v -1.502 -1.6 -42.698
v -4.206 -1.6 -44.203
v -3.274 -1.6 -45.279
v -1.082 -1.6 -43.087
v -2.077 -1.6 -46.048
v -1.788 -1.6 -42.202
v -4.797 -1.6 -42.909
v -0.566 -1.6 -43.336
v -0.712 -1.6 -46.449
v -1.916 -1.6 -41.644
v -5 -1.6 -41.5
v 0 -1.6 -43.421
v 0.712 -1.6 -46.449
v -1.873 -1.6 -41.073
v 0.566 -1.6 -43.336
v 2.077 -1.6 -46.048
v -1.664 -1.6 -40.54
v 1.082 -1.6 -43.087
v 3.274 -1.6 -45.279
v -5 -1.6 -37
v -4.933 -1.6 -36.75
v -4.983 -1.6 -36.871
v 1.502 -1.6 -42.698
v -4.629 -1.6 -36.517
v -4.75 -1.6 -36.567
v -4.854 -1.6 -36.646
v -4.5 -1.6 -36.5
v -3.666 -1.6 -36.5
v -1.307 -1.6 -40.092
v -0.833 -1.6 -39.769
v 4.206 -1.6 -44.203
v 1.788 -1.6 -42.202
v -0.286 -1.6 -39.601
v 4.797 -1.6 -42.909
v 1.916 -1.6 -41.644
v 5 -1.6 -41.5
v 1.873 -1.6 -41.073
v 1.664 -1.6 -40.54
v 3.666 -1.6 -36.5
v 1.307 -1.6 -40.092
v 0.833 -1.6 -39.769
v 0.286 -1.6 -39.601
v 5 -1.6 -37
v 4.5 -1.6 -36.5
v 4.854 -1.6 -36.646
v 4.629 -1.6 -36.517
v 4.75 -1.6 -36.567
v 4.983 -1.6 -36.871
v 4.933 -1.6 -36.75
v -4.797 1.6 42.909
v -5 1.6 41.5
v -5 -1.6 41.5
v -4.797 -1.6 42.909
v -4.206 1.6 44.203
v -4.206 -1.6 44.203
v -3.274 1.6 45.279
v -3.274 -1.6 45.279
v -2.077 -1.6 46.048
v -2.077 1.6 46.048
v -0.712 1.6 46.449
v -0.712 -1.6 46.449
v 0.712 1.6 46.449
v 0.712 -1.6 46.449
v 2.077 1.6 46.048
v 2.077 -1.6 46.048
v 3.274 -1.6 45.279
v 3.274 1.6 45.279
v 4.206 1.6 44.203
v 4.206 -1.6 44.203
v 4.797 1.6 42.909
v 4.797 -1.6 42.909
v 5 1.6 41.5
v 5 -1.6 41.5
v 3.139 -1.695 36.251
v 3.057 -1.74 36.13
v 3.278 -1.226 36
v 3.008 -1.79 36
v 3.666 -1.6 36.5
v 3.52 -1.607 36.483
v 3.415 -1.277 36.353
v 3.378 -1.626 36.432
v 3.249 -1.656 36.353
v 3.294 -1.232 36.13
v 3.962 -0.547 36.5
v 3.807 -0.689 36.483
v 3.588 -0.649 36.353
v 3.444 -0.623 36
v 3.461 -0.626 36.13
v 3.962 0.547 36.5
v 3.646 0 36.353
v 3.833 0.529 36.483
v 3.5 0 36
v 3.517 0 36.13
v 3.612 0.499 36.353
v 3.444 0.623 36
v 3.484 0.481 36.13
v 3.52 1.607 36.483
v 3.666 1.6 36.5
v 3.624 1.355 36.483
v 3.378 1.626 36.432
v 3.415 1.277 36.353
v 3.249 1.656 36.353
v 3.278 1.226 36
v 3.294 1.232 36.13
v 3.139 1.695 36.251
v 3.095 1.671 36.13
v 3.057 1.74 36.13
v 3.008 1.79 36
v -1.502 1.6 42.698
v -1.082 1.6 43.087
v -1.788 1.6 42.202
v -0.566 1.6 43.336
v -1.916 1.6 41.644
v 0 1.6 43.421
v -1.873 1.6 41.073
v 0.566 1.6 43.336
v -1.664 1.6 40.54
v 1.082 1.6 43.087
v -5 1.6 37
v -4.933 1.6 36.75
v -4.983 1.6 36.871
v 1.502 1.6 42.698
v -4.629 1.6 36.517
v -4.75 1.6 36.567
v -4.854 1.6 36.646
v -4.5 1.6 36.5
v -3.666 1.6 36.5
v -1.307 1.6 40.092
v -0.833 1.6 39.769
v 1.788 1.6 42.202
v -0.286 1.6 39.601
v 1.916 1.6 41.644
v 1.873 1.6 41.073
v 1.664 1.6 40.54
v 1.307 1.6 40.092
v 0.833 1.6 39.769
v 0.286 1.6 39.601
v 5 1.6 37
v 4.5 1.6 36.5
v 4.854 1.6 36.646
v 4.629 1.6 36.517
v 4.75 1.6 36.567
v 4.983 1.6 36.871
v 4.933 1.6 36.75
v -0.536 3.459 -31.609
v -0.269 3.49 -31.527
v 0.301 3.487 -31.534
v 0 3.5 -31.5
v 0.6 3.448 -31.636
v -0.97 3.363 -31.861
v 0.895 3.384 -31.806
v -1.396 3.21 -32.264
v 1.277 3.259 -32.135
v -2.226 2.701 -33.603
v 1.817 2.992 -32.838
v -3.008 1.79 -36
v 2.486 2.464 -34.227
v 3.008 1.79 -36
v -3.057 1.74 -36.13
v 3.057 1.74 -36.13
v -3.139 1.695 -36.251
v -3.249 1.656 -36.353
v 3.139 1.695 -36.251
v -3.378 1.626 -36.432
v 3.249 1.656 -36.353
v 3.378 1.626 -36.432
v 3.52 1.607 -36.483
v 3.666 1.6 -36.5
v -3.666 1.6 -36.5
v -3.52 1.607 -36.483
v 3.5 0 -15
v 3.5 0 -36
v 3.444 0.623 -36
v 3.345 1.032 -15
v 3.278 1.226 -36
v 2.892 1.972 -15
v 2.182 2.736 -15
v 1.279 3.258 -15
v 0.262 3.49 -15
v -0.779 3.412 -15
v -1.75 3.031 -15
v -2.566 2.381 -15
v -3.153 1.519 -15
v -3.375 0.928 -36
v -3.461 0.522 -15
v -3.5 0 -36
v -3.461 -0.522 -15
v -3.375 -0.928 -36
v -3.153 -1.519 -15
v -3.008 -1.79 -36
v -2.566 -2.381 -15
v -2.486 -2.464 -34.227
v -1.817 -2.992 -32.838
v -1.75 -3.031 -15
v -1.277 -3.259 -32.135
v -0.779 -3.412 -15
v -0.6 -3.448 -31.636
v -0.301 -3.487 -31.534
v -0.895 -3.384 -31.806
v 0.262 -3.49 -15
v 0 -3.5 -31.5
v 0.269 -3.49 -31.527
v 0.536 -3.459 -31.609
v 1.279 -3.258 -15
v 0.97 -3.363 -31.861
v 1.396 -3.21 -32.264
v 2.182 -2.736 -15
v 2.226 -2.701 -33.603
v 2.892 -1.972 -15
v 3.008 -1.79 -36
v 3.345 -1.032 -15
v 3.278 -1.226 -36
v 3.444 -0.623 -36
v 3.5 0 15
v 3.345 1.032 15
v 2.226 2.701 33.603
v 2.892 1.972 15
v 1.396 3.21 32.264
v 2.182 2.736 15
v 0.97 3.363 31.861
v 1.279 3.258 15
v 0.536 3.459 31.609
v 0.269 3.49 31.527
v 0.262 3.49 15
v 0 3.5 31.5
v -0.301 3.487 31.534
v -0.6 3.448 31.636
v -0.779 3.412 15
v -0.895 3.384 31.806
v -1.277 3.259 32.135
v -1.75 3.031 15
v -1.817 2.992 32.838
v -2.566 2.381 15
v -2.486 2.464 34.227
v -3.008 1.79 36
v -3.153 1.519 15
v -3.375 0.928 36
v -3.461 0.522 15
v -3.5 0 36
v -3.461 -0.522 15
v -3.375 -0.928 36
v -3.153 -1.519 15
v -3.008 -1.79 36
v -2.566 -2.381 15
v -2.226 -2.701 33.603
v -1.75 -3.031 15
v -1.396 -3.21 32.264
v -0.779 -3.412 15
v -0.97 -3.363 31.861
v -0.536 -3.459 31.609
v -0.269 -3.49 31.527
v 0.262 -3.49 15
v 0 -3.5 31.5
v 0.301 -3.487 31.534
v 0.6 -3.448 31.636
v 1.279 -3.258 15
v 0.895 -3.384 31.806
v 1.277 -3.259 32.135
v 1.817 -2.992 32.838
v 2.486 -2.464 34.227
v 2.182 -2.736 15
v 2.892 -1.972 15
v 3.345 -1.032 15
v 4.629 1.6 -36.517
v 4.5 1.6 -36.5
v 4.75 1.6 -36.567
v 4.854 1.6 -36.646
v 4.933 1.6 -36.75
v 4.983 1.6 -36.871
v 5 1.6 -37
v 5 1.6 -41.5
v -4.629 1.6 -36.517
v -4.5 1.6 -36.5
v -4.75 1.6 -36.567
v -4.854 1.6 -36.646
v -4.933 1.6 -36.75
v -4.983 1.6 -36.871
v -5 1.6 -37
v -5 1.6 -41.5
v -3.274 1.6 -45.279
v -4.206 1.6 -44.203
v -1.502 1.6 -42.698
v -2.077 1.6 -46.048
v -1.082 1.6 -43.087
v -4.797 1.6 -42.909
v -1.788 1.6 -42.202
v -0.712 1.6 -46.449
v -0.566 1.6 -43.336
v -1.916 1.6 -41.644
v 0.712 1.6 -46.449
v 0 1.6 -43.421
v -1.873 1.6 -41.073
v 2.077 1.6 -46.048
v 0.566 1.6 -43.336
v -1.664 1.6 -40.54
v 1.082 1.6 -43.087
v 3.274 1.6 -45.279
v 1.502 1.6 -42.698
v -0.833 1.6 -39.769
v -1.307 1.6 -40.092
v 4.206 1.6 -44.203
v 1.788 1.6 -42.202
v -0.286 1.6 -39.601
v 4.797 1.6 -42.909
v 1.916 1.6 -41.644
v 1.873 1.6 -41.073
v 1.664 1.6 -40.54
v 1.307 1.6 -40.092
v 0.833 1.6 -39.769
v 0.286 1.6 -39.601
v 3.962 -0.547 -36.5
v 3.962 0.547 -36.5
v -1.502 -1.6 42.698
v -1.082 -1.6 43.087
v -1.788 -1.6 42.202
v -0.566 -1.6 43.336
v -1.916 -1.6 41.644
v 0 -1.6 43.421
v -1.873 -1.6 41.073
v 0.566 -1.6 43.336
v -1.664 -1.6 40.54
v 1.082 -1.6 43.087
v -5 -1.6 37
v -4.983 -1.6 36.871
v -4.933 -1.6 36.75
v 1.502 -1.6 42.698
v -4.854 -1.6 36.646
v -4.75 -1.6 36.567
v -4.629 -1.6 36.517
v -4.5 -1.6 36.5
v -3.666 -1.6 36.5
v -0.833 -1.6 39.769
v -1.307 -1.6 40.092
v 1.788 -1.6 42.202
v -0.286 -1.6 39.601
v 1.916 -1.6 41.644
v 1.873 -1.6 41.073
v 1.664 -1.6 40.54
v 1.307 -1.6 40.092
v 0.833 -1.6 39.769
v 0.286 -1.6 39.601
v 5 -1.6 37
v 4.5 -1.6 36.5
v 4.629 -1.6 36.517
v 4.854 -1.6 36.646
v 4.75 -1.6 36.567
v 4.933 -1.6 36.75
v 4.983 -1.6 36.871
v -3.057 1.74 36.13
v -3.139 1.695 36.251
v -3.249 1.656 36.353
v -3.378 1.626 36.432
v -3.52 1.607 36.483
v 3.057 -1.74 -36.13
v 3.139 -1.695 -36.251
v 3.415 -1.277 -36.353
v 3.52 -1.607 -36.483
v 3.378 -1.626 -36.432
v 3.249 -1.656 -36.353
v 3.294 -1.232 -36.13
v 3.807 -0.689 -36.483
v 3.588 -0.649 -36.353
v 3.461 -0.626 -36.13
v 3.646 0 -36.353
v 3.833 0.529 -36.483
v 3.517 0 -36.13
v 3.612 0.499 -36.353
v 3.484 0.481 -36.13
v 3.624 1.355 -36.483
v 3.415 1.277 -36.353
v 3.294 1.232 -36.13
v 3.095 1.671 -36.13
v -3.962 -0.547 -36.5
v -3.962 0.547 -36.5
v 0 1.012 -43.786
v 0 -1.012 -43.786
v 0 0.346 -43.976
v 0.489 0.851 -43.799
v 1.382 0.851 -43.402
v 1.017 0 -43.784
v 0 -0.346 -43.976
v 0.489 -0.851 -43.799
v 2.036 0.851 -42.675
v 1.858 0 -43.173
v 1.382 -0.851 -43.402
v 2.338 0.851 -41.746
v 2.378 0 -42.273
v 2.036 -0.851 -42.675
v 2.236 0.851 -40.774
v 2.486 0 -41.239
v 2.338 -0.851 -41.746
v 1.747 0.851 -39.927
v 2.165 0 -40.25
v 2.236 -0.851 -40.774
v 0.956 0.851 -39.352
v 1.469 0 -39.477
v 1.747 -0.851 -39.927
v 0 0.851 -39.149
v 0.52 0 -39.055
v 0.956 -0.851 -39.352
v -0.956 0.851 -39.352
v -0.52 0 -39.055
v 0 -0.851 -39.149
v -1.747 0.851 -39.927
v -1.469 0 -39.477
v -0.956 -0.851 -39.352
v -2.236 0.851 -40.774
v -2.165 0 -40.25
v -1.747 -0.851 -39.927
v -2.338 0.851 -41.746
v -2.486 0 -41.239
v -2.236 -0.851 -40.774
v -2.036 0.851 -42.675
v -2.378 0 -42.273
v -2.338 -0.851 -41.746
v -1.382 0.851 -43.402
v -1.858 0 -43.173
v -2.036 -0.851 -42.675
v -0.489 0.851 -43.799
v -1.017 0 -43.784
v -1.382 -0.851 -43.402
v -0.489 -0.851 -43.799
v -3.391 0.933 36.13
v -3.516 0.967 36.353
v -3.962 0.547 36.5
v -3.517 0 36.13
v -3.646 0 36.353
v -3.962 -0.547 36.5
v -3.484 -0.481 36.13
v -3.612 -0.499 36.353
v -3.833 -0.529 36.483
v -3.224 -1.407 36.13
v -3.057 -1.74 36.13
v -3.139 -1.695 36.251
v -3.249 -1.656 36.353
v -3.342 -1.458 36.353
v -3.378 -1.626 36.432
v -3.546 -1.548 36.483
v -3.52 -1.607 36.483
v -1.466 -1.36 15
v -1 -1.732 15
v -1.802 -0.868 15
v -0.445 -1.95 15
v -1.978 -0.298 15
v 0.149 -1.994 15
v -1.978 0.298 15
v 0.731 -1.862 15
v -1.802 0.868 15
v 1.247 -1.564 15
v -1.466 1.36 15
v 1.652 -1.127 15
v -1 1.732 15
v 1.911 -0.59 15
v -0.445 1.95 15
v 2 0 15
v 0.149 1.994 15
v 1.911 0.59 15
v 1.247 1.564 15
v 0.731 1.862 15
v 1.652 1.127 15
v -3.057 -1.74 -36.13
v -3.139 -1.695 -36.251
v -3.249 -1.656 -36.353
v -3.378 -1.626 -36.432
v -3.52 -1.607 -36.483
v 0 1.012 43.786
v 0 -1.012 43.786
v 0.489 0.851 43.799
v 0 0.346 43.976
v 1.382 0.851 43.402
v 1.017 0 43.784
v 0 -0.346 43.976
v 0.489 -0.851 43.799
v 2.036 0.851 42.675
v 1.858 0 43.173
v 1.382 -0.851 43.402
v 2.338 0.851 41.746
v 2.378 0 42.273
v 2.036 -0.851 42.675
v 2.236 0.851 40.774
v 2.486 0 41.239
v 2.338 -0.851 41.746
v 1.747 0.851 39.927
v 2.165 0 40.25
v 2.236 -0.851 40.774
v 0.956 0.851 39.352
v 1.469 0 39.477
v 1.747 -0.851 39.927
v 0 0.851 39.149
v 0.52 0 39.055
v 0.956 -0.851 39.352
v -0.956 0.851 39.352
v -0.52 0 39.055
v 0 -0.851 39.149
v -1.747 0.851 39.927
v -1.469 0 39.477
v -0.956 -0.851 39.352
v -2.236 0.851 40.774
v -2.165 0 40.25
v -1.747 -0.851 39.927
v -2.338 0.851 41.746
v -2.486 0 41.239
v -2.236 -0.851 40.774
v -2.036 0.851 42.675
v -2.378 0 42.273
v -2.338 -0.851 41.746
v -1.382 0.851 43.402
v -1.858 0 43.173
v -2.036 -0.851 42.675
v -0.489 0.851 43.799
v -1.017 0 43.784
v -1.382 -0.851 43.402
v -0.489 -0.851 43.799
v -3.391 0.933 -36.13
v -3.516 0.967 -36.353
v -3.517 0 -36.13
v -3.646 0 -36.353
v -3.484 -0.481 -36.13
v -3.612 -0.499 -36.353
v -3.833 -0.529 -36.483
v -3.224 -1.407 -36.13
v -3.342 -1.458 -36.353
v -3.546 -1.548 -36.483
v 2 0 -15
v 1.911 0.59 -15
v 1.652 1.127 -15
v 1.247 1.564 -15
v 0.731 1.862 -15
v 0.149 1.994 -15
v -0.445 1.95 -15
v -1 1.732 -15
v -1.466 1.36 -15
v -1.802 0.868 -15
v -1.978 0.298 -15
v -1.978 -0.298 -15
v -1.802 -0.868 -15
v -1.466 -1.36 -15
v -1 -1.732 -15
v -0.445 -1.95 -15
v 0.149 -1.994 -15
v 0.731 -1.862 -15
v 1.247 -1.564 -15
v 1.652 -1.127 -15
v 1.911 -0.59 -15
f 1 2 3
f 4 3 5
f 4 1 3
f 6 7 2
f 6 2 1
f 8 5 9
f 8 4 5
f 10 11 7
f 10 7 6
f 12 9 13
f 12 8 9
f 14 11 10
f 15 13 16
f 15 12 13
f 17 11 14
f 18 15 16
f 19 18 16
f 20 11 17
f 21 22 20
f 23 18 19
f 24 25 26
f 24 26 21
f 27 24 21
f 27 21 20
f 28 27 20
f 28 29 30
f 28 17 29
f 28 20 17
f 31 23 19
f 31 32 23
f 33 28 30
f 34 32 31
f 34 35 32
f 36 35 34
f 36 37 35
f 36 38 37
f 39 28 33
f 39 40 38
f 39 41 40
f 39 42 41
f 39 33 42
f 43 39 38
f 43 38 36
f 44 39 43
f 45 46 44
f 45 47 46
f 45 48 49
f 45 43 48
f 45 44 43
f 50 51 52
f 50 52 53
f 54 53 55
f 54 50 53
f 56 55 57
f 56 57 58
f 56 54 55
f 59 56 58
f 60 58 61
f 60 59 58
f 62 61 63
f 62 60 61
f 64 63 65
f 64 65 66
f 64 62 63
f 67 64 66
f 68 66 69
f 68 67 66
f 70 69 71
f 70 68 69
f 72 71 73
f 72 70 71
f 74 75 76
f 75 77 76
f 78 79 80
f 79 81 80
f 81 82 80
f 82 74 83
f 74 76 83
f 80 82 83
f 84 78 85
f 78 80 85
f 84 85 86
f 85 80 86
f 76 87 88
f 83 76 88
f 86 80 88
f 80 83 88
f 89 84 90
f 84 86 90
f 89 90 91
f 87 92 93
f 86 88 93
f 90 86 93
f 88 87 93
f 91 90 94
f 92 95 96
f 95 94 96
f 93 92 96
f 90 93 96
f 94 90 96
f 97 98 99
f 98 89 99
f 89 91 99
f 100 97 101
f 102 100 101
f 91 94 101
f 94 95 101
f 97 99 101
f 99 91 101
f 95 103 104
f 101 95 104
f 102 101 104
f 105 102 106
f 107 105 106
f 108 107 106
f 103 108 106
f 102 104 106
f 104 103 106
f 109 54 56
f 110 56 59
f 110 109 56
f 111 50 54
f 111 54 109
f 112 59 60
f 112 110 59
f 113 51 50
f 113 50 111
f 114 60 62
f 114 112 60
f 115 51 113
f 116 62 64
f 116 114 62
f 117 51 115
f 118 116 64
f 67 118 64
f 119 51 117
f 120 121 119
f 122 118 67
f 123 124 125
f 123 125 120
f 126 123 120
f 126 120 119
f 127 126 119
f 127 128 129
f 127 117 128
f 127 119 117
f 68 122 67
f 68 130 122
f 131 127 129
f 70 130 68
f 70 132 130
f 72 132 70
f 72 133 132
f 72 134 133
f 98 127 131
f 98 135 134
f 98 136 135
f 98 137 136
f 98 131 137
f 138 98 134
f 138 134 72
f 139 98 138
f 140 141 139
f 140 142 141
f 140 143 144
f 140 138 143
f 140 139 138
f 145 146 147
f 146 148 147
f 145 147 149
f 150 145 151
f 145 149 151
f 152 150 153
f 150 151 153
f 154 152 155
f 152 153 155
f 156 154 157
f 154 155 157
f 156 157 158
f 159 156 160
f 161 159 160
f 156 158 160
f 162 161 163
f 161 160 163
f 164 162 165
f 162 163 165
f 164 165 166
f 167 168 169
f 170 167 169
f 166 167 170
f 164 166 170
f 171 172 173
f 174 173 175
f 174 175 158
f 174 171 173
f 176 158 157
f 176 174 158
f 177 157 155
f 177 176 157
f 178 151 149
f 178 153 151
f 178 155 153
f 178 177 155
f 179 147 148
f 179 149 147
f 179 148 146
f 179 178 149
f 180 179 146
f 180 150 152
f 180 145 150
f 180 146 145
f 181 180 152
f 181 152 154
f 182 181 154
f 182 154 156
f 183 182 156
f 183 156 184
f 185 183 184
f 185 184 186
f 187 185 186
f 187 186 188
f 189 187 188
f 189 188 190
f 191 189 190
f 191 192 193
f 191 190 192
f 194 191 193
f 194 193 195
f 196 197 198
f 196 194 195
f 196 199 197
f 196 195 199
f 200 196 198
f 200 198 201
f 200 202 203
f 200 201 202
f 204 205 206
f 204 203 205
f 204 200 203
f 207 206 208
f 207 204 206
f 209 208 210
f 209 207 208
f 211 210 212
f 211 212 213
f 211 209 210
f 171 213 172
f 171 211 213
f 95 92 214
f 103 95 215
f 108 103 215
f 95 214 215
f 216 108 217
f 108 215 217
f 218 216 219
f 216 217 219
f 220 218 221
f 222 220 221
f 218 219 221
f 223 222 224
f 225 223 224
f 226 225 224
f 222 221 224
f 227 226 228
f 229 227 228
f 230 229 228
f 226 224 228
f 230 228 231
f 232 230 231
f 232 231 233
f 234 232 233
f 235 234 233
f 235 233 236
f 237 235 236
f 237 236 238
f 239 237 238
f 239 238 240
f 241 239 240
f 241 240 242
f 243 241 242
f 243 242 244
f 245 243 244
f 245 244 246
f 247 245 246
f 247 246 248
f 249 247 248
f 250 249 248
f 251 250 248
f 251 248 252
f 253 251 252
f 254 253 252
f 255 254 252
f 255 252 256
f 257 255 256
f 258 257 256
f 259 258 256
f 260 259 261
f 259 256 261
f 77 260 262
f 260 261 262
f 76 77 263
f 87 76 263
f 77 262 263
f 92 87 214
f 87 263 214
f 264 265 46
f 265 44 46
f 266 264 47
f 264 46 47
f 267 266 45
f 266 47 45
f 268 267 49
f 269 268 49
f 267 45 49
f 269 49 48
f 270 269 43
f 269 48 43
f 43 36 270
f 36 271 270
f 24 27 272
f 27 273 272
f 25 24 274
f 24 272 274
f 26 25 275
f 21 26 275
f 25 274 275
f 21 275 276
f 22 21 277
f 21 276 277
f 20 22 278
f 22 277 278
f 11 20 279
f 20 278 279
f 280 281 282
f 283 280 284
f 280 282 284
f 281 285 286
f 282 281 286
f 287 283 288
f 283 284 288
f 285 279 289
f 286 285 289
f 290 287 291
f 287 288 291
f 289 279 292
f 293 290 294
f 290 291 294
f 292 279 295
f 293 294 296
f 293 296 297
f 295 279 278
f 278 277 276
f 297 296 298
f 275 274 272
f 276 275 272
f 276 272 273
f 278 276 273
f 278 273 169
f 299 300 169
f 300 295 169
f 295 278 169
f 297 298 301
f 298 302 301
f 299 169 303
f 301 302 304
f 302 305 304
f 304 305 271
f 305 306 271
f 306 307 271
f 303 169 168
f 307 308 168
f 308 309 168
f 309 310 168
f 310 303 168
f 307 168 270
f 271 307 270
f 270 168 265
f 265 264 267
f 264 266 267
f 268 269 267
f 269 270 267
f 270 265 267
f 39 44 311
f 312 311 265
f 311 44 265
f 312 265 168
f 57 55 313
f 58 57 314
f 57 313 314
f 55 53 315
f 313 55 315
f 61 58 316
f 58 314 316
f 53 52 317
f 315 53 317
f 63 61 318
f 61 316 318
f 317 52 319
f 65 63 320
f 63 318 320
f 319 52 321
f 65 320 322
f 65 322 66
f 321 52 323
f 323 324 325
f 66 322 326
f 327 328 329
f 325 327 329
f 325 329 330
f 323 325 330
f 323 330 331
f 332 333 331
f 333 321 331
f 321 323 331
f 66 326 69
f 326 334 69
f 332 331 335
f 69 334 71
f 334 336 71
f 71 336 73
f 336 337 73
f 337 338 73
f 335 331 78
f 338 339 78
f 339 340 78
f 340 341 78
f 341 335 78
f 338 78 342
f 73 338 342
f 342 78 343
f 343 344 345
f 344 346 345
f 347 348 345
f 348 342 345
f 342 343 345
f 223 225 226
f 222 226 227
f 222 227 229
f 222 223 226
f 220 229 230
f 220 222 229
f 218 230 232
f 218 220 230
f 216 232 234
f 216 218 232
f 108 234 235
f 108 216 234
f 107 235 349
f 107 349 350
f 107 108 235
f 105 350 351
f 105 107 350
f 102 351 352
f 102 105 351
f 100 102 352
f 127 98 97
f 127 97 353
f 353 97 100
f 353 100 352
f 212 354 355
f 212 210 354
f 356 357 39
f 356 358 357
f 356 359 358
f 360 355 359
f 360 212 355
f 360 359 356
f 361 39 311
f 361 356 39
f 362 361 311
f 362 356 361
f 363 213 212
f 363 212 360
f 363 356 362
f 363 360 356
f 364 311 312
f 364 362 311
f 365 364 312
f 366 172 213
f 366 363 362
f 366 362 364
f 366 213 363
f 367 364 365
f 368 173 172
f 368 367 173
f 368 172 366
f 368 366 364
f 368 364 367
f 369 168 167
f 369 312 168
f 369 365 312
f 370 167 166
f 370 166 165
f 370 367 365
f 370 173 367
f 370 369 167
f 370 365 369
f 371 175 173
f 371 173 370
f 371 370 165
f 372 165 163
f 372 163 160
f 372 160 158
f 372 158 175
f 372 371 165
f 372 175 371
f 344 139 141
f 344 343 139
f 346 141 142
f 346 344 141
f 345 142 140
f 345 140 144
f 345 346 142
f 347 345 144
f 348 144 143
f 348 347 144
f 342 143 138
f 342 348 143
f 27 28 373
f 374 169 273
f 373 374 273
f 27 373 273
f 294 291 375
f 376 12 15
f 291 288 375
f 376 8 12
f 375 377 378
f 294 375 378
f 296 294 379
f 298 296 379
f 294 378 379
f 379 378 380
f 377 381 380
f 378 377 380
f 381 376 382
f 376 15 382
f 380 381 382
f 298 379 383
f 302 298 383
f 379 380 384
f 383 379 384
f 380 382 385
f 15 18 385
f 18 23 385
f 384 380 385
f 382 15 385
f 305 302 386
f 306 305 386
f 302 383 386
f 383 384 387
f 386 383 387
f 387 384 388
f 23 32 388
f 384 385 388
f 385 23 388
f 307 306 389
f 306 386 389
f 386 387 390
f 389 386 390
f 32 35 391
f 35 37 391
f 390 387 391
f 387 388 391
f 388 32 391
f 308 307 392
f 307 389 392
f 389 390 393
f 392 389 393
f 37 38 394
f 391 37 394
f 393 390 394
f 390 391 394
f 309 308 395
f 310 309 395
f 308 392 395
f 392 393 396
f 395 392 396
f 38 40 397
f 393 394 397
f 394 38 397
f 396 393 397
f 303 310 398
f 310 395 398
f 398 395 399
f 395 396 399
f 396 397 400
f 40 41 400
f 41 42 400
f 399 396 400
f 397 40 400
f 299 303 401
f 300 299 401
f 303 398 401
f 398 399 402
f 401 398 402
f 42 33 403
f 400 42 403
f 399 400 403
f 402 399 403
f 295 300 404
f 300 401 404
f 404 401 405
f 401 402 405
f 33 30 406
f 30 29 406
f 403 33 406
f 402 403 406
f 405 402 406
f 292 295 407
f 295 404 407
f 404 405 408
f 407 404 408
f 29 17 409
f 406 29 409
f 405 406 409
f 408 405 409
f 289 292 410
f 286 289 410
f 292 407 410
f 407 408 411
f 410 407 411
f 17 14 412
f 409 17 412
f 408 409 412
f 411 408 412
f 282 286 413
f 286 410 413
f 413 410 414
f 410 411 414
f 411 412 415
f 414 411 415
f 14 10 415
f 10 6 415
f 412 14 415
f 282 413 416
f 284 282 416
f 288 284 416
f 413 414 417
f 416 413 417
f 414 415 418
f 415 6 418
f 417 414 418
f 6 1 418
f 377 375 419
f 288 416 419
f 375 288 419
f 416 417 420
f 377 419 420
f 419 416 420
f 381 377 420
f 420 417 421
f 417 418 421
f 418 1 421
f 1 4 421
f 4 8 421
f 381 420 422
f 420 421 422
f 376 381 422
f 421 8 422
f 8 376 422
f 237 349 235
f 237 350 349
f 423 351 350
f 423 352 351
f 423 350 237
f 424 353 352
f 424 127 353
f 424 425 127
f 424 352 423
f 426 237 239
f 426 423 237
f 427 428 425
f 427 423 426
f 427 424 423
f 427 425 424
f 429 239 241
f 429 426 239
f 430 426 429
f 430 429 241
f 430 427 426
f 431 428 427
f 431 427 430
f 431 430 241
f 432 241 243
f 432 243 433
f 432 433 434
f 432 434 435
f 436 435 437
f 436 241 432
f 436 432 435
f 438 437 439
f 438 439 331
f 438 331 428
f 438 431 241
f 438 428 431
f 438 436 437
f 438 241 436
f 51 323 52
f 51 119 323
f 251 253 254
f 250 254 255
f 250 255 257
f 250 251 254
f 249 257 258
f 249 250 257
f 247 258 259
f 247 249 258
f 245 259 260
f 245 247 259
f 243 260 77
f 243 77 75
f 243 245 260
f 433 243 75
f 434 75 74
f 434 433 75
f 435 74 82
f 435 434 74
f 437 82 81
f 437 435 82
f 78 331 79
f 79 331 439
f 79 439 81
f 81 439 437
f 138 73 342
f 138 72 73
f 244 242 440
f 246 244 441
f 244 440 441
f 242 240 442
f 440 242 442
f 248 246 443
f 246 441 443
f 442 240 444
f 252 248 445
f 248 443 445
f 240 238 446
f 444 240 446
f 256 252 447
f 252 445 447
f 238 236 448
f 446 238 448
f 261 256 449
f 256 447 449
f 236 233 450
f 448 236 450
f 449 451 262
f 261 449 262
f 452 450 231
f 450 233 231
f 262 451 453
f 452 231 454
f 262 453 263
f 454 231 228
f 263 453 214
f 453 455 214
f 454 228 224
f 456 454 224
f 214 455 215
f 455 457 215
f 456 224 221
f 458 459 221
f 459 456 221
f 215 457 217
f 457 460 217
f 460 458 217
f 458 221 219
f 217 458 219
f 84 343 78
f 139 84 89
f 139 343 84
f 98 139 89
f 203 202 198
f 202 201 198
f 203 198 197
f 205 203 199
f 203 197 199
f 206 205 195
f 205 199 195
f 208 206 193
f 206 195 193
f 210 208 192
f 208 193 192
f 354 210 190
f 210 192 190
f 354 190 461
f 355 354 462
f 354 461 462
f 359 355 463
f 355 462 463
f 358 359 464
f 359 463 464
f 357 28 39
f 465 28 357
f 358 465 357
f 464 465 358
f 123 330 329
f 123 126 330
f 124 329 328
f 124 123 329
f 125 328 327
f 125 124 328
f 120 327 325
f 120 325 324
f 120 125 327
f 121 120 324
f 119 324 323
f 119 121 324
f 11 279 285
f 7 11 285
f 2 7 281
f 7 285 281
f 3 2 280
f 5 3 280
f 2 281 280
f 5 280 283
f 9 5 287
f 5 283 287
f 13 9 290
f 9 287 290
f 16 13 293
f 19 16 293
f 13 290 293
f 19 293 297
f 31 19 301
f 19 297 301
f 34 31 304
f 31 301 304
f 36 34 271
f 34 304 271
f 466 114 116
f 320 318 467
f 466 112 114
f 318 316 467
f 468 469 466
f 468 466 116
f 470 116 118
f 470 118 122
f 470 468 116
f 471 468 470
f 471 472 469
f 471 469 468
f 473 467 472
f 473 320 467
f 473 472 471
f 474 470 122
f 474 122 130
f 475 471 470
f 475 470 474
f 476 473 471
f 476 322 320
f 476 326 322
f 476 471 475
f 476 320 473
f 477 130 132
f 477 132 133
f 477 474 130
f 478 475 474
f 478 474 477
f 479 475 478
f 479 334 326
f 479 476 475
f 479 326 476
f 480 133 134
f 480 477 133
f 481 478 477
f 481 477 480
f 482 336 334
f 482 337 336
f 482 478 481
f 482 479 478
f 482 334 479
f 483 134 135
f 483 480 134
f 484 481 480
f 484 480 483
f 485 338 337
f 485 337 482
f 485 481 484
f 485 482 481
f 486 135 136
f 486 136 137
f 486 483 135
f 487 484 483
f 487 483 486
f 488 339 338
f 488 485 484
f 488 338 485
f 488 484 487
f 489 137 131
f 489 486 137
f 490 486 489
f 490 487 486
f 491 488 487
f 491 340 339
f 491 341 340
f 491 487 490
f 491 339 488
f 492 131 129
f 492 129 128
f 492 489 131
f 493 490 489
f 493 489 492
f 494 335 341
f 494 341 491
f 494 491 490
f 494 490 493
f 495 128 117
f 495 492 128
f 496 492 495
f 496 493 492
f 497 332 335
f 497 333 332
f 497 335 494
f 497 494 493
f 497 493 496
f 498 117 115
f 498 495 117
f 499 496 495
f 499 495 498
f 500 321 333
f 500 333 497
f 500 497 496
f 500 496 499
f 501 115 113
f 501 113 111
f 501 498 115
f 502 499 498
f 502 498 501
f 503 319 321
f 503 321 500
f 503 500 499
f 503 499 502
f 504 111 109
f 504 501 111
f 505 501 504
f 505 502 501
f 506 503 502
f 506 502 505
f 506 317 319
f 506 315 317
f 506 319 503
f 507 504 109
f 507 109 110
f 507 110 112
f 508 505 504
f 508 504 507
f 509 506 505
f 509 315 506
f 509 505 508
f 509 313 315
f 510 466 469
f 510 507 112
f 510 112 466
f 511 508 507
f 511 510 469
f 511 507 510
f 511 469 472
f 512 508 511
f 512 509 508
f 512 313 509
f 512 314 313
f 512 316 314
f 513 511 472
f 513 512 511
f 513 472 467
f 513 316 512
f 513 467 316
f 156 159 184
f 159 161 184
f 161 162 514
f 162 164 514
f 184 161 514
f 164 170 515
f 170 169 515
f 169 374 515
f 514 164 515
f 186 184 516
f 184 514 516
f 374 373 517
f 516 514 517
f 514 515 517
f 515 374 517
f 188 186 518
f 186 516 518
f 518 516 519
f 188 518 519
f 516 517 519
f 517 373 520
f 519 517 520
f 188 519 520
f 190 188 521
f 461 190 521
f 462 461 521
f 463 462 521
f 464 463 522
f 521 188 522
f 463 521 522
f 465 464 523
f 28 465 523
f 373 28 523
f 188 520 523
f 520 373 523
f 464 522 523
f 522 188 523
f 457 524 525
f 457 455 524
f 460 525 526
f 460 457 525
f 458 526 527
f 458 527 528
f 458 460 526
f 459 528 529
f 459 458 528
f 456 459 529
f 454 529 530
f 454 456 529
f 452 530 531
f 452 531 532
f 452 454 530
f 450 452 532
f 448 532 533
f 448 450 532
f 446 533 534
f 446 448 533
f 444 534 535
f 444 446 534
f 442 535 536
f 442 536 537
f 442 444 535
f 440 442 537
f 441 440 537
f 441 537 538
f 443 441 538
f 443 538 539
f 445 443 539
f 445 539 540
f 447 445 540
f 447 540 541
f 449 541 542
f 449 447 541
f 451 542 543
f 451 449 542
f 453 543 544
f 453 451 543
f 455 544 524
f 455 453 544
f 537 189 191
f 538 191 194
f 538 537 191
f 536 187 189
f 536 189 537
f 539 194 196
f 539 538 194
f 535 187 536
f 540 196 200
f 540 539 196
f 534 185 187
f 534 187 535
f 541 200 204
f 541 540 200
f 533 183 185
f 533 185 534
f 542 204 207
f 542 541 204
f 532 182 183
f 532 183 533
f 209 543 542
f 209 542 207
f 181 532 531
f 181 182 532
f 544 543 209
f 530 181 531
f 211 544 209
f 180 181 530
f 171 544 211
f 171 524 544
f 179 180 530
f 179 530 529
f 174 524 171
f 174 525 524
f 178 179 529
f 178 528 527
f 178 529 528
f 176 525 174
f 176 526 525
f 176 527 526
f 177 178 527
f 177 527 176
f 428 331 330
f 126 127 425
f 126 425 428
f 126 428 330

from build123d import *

# Parameters (mm, degrees)
SKETCH1_R                  = 2
SCREW_SECTION_DEPTH        = 15
SKETCH2_R                  = 3.5
BAR_SECTION_DEPTH          = 21.5
MOUNT_SECTION_DEPTH        = 1.6
BAR_TAPER_DEPTH            = 6
MOUNT_FILLET_R             = 0.5
MOUNT_FILLET_OF_MIRROR_2_R = 0.5


with BuildPart() as part:
    # Sketch1 → Screw Section (new body)
    with BuildSketch(Plane.XY):
        Circle(SKETCH1_R)
    screw_section = extrude(amount=SCREW_SECTION_DEPTH)

    # Sketch2 → Bar Section (add)
    with BuildSketch(Plane.XY.offset(15)):
        Circle(SKETCH2_R)
    bar_section = extrude(amount=BAR_SECTION_DEPTH)

    # Sketch3 → Mount Section (add, symmetric)
    with BuildSketch(Plane(origin=(0, 0, 0), x_dir=(1, 0, 0), z_dir=(0, 1, 0))):
        with BuildLine():
            Line((5, -36.5), (-5, -36.5))
            Line((-5, -36.5), (-5, -41.5))
            ThreePointArc((-5, -41.5), (0, -46.5), (5, -41.5))
            Line((5, -41.5), (5, -36.5))
        make_face()
    mount_section = extrude(amount=MOUNT_SECTION_DEPTH, both=True)

    # Sketch4 → Bar Taper (cut, symmetric)
    with BuildSketch(Plane(origin=(0, 0, 0), x_dir=(0, 0, -1), z_dir=(1, 0, 0))):
        Polygon((-31.5, -3.5), (-36.5, -1.6), (-36.5, -3.5), align=None)
        Polygon((-31.5, 3.5), (-36.5, 1.6), (-36.5, 3.5), align=None)
    bar_taper = extrude(amount=BAR_TAPER_DEPTH, both=True, mode=Mode.SUBTRACT)

    # Mount Fillet
    mount_fillet_edges = [part.edges().sort_by_distance(p)[0] for p in [
        (-5, 0, 36.5),
        (3.401842713, -0.823083322, 36.5),
        (-3.5, 0, 36.5),
        (5, 0, 36.5),
    ]]
    fillet(mount_fillet_edges, radius=MOUNT_FILLET_R)

    # Sketch6 → Ball Hole (revolve, cut)
    with BuildSketch(Plane(origin=(0, 0, 0), x_dir=(0, 0, -1), z_dir=(1, 0, 0))):
        with BuildLine():
            Line((-43.420937271, -1.6), (-41.5, -1.6))
            Line((-41.5, -1.6), (-41.5, 1.6))
            Line((-41.5, 1.6), (-43.420937271, 1.6))
            ThreePointArc((-43.420937271, 1.6), (-44, 0), (-43.420937271, -1.6))
        make_face()
    ball_hole = revolve(axis=Axis((0, -1.6, 41.5), (0, 1, 0)), mode=Mode.SUBTRACT)

    # Mirror 2: Screw Section, Bar Section, Mount Section, Bar Taper, Ball Hole across Front Plane
    add(screw_section.mirror(Plane.XY))
    add(bar_section.mirror(Plane.XY))
    add(mount_section.mirror(Plane.XY))
    add(bar_taper.mirror(Plane.XY), mode=Mode.SUBTRACT)
    add(ball_hole.mirror(Plane.XY), mode=Mode.SUBTRACT)

    # Mount Fillet of Mirror 2
    mount_fillet_of_mirror_2_edges = [part.edges().sort_by_distance(p)[0] for p in [
        (-5, 0, -36.5),
        (3.401842713, -0.823083322, -36.5),
        (-3.5, 0, -36.5),
        (5, 0, -36.5),
    ]]
    fillet(mount_fillet_of_mirror_2_edges, radius=MOUNT_FILLET_OF_MIRROR_2_R)


solid = part.part
